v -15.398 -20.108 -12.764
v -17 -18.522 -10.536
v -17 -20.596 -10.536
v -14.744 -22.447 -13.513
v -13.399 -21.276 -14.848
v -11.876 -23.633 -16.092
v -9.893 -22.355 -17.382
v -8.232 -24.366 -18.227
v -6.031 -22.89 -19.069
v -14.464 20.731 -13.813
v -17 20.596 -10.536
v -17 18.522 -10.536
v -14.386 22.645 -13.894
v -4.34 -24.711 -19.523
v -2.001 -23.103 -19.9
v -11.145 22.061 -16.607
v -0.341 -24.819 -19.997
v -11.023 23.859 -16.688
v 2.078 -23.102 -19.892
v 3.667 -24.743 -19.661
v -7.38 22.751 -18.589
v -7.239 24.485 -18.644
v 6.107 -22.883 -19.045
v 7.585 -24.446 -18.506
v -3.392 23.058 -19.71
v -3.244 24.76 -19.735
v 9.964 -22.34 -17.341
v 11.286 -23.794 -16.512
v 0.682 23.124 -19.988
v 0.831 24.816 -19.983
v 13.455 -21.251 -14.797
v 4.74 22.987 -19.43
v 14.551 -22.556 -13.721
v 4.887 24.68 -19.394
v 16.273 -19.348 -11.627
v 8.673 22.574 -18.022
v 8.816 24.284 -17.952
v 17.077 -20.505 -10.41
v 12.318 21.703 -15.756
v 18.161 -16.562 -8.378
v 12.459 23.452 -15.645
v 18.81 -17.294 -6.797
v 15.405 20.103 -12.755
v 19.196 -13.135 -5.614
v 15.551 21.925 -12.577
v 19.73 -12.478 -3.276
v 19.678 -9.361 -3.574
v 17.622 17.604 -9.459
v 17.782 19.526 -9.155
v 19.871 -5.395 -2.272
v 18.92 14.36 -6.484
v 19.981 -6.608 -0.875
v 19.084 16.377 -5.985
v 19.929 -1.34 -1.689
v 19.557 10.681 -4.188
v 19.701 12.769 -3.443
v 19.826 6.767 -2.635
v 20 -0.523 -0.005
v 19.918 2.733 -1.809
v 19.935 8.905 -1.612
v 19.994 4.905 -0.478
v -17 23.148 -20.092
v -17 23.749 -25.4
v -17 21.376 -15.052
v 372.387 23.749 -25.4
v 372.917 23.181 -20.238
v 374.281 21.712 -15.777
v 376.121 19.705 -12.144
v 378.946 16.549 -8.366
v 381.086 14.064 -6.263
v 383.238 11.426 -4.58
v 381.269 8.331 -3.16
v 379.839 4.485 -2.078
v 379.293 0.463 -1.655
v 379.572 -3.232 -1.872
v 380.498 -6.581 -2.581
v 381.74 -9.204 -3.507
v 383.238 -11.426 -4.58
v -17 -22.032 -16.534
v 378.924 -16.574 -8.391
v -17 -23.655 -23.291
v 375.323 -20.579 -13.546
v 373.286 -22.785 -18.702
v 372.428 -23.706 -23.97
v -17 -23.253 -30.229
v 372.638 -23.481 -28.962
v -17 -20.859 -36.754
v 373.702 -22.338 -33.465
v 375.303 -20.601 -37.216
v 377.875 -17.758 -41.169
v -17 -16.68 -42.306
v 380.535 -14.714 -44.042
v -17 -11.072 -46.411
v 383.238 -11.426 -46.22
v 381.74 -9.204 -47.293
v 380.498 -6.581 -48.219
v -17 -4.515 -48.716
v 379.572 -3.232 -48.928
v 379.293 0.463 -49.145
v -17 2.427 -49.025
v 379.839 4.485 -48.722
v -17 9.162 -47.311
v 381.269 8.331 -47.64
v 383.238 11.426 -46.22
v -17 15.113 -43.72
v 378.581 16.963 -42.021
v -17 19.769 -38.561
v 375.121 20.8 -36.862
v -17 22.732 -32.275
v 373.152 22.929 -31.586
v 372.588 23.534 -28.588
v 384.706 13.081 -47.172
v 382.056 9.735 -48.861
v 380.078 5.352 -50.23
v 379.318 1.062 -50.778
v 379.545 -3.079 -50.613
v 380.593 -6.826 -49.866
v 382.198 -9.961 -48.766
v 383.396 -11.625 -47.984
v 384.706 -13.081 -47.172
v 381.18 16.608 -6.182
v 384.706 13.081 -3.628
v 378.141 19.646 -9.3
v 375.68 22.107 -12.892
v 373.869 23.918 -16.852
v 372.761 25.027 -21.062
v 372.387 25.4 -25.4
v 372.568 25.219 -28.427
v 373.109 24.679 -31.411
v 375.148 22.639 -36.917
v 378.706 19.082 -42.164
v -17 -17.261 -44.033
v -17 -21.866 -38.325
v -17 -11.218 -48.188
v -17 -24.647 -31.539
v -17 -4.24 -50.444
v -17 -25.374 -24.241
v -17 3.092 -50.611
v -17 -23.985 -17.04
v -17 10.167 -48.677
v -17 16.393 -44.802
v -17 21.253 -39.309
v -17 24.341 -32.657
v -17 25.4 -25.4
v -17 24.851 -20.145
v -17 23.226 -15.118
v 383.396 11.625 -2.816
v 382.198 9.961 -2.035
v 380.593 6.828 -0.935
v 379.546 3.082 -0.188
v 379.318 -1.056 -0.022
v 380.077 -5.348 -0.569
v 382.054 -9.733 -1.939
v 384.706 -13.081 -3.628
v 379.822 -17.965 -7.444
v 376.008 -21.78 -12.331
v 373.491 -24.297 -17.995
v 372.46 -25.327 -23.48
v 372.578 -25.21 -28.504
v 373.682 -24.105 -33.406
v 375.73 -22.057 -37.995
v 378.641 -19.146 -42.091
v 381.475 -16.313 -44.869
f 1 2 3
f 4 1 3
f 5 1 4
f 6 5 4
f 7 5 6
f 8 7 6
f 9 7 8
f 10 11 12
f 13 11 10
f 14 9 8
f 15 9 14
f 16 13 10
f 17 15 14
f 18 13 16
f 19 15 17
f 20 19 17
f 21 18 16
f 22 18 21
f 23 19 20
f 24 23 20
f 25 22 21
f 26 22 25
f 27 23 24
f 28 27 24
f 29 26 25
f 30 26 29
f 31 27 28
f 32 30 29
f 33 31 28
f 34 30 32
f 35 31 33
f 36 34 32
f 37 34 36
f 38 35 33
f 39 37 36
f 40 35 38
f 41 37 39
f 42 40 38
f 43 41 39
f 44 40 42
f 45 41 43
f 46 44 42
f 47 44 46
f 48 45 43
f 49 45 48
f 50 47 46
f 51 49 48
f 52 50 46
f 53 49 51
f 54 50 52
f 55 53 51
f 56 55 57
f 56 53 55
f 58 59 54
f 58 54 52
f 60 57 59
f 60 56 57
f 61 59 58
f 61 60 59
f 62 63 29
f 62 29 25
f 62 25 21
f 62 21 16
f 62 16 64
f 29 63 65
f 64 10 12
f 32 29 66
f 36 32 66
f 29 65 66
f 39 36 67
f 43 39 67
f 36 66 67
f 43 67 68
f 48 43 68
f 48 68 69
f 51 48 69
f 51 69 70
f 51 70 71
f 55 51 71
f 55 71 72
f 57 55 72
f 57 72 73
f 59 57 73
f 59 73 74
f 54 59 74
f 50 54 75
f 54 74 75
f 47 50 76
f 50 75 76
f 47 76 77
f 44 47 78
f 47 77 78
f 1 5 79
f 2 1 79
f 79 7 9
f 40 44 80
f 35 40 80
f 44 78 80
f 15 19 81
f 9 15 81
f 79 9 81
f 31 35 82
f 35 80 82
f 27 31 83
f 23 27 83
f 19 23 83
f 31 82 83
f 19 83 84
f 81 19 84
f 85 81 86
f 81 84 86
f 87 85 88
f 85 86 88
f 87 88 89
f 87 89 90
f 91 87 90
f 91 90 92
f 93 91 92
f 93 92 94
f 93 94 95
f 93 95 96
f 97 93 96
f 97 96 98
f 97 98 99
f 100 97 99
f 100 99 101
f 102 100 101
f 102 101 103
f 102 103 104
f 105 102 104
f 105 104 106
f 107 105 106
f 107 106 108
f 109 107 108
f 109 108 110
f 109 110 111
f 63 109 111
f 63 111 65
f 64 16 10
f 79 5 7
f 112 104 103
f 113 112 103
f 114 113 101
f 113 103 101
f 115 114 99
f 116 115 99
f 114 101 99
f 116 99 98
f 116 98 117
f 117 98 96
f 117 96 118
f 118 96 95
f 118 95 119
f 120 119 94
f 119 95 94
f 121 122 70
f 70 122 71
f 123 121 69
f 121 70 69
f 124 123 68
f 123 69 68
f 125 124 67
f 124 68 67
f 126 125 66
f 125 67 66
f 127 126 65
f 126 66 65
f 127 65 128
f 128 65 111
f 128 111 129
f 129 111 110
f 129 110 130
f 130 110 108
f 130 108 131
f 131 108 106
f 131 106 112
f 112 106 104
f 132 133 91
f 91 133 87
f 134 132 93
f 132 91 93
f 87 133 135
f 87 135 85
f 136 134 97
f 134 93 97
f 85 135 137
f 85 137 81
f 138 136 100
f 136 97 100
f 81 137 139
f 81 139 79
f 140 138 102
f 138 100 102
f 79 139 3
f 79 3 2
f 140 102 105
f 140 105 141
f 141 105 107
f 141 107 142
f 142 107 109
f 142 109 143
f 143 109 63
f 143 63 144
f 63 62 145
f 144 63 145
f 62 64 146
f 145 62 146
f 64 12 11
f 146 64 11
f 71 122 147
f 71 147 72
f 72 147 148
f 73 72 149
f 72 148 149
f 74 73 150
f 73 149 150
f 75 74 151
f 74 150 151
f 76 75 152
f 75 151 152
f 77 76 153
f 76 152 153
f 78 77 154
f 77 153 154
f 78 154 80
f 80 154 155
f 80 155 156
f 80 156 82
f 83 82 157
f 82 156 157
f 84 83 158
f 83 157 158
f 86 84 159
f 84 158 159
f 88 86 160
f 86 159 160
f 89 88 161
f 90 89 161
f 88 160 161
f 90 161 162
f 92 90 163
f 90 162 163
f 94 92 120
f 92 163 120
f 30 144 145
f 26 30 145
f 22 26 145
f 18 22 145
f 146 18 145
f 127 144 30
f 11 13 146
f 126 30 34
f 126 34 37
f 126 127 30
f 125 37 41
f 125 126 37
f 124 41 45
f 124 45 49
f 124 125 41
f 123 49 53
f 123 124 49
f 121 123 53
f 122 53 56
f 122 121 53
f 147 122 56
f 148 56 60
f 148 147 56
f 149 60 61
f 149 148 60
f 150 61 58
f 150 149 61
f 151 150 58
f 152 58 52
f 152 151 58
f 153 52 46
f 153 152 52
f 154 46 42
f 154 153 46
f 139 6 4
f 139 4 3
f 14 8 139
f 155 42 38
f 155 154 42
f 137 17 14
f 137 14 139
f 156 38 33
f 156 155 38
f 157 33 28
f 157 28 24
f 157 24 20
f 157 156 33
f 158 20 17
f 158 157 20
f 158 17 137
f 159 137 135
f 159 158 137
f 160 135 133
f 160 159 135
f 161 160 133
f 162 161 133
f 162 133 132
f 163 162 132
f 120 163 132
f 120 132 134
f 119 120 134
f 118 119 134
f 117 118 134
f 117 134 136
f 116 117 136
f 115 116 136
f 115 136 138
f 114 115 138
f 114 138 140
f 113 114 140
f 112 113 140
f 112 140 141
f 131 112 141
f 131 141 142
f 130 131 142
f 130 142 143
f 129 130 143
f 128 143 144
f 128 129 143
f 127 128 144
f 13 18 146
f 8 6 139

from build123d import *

# Parameters (mm, degrees)
SKETCH002_R          = 25.4
PAD_DEPTH            = 397.787357
PAD_DEPTH_BACK       = 17
SKETCH011_R          = 23.749191
POCKET002_DEPTH      = 414.788357
SKETCH010_R          = 20
POCKET003_DEPTH      = 25.401
POCKET003_DEPTH_BACK = 25.401
SKETCH019_R          = 25.4
POCKET008_DEPTH      = 25.401
POCKET008_DEPTH_BACK = 25.401
SKETCH020_R          = 18.5
POCKET009_DEPTH      = 50.801


with BuildPart() as part:
    # Sketch002 → Pad (new body, two sides)
    with BuildSketch(Plane.YZ) as pad_sk:
        with Locations((0, -25.4)):
            Circle(SKETCH002_R)
    extrude(amount=PAD_DEPTH)
    extrude(pad_sk.sketch, amount=-PAD_DEPTH_BACK)

    # Sketch011 (on Face3 of Pad) → Pocket002 (cut, through all)
    with BuildSketch(Plane.YZ.offset(397.787357)):
        with Locations((0, -25.4)):
            Circle(SKETCH011_R)
    extrude(amount=-POCKET002_DEPTH, mode=Mode.SUBTRACT)

    # Sketch010 → Pocket003 (cut, two sides)
    with BuildSketch(Plane.XZ) as pocket003_sk:
        Circle(SKETCH010_R)
    extrude(amount=-POCKET003_DEPTH, mode=Mode.SUBTRACT)
    extrude(pocket003_sk.sketch, amount=POCKET003_DEPTH_BACK, mode=Mode.SUBTRACT)

    # Sketch019 → Pocket008 (cut, two sides)
    with BuildSketch(Plane.XZ) as pocket008_sk:
        with Locations((397.787357, -25.4)):
            Circle(SKETCH019_R)
    extrude(amount=-POCKET008_DEPTH, mode=Mode.SUBTRACT)
    extrude(pocket008_sk.sketch, amount=POCKET008_DEPTH_BACK, mode=Mode.SUBTRACT)

    # Sketch020 → Pocket009 (cut, through all)
    with BuildSketch(Plane.XY):
        with Locations((397.787357, 0)):
            Circle(SKETCH020_R)
    extrude(amount=-POCKET009_DEPTH, mode=Mode.SUBTRACT)


solid = part.part
